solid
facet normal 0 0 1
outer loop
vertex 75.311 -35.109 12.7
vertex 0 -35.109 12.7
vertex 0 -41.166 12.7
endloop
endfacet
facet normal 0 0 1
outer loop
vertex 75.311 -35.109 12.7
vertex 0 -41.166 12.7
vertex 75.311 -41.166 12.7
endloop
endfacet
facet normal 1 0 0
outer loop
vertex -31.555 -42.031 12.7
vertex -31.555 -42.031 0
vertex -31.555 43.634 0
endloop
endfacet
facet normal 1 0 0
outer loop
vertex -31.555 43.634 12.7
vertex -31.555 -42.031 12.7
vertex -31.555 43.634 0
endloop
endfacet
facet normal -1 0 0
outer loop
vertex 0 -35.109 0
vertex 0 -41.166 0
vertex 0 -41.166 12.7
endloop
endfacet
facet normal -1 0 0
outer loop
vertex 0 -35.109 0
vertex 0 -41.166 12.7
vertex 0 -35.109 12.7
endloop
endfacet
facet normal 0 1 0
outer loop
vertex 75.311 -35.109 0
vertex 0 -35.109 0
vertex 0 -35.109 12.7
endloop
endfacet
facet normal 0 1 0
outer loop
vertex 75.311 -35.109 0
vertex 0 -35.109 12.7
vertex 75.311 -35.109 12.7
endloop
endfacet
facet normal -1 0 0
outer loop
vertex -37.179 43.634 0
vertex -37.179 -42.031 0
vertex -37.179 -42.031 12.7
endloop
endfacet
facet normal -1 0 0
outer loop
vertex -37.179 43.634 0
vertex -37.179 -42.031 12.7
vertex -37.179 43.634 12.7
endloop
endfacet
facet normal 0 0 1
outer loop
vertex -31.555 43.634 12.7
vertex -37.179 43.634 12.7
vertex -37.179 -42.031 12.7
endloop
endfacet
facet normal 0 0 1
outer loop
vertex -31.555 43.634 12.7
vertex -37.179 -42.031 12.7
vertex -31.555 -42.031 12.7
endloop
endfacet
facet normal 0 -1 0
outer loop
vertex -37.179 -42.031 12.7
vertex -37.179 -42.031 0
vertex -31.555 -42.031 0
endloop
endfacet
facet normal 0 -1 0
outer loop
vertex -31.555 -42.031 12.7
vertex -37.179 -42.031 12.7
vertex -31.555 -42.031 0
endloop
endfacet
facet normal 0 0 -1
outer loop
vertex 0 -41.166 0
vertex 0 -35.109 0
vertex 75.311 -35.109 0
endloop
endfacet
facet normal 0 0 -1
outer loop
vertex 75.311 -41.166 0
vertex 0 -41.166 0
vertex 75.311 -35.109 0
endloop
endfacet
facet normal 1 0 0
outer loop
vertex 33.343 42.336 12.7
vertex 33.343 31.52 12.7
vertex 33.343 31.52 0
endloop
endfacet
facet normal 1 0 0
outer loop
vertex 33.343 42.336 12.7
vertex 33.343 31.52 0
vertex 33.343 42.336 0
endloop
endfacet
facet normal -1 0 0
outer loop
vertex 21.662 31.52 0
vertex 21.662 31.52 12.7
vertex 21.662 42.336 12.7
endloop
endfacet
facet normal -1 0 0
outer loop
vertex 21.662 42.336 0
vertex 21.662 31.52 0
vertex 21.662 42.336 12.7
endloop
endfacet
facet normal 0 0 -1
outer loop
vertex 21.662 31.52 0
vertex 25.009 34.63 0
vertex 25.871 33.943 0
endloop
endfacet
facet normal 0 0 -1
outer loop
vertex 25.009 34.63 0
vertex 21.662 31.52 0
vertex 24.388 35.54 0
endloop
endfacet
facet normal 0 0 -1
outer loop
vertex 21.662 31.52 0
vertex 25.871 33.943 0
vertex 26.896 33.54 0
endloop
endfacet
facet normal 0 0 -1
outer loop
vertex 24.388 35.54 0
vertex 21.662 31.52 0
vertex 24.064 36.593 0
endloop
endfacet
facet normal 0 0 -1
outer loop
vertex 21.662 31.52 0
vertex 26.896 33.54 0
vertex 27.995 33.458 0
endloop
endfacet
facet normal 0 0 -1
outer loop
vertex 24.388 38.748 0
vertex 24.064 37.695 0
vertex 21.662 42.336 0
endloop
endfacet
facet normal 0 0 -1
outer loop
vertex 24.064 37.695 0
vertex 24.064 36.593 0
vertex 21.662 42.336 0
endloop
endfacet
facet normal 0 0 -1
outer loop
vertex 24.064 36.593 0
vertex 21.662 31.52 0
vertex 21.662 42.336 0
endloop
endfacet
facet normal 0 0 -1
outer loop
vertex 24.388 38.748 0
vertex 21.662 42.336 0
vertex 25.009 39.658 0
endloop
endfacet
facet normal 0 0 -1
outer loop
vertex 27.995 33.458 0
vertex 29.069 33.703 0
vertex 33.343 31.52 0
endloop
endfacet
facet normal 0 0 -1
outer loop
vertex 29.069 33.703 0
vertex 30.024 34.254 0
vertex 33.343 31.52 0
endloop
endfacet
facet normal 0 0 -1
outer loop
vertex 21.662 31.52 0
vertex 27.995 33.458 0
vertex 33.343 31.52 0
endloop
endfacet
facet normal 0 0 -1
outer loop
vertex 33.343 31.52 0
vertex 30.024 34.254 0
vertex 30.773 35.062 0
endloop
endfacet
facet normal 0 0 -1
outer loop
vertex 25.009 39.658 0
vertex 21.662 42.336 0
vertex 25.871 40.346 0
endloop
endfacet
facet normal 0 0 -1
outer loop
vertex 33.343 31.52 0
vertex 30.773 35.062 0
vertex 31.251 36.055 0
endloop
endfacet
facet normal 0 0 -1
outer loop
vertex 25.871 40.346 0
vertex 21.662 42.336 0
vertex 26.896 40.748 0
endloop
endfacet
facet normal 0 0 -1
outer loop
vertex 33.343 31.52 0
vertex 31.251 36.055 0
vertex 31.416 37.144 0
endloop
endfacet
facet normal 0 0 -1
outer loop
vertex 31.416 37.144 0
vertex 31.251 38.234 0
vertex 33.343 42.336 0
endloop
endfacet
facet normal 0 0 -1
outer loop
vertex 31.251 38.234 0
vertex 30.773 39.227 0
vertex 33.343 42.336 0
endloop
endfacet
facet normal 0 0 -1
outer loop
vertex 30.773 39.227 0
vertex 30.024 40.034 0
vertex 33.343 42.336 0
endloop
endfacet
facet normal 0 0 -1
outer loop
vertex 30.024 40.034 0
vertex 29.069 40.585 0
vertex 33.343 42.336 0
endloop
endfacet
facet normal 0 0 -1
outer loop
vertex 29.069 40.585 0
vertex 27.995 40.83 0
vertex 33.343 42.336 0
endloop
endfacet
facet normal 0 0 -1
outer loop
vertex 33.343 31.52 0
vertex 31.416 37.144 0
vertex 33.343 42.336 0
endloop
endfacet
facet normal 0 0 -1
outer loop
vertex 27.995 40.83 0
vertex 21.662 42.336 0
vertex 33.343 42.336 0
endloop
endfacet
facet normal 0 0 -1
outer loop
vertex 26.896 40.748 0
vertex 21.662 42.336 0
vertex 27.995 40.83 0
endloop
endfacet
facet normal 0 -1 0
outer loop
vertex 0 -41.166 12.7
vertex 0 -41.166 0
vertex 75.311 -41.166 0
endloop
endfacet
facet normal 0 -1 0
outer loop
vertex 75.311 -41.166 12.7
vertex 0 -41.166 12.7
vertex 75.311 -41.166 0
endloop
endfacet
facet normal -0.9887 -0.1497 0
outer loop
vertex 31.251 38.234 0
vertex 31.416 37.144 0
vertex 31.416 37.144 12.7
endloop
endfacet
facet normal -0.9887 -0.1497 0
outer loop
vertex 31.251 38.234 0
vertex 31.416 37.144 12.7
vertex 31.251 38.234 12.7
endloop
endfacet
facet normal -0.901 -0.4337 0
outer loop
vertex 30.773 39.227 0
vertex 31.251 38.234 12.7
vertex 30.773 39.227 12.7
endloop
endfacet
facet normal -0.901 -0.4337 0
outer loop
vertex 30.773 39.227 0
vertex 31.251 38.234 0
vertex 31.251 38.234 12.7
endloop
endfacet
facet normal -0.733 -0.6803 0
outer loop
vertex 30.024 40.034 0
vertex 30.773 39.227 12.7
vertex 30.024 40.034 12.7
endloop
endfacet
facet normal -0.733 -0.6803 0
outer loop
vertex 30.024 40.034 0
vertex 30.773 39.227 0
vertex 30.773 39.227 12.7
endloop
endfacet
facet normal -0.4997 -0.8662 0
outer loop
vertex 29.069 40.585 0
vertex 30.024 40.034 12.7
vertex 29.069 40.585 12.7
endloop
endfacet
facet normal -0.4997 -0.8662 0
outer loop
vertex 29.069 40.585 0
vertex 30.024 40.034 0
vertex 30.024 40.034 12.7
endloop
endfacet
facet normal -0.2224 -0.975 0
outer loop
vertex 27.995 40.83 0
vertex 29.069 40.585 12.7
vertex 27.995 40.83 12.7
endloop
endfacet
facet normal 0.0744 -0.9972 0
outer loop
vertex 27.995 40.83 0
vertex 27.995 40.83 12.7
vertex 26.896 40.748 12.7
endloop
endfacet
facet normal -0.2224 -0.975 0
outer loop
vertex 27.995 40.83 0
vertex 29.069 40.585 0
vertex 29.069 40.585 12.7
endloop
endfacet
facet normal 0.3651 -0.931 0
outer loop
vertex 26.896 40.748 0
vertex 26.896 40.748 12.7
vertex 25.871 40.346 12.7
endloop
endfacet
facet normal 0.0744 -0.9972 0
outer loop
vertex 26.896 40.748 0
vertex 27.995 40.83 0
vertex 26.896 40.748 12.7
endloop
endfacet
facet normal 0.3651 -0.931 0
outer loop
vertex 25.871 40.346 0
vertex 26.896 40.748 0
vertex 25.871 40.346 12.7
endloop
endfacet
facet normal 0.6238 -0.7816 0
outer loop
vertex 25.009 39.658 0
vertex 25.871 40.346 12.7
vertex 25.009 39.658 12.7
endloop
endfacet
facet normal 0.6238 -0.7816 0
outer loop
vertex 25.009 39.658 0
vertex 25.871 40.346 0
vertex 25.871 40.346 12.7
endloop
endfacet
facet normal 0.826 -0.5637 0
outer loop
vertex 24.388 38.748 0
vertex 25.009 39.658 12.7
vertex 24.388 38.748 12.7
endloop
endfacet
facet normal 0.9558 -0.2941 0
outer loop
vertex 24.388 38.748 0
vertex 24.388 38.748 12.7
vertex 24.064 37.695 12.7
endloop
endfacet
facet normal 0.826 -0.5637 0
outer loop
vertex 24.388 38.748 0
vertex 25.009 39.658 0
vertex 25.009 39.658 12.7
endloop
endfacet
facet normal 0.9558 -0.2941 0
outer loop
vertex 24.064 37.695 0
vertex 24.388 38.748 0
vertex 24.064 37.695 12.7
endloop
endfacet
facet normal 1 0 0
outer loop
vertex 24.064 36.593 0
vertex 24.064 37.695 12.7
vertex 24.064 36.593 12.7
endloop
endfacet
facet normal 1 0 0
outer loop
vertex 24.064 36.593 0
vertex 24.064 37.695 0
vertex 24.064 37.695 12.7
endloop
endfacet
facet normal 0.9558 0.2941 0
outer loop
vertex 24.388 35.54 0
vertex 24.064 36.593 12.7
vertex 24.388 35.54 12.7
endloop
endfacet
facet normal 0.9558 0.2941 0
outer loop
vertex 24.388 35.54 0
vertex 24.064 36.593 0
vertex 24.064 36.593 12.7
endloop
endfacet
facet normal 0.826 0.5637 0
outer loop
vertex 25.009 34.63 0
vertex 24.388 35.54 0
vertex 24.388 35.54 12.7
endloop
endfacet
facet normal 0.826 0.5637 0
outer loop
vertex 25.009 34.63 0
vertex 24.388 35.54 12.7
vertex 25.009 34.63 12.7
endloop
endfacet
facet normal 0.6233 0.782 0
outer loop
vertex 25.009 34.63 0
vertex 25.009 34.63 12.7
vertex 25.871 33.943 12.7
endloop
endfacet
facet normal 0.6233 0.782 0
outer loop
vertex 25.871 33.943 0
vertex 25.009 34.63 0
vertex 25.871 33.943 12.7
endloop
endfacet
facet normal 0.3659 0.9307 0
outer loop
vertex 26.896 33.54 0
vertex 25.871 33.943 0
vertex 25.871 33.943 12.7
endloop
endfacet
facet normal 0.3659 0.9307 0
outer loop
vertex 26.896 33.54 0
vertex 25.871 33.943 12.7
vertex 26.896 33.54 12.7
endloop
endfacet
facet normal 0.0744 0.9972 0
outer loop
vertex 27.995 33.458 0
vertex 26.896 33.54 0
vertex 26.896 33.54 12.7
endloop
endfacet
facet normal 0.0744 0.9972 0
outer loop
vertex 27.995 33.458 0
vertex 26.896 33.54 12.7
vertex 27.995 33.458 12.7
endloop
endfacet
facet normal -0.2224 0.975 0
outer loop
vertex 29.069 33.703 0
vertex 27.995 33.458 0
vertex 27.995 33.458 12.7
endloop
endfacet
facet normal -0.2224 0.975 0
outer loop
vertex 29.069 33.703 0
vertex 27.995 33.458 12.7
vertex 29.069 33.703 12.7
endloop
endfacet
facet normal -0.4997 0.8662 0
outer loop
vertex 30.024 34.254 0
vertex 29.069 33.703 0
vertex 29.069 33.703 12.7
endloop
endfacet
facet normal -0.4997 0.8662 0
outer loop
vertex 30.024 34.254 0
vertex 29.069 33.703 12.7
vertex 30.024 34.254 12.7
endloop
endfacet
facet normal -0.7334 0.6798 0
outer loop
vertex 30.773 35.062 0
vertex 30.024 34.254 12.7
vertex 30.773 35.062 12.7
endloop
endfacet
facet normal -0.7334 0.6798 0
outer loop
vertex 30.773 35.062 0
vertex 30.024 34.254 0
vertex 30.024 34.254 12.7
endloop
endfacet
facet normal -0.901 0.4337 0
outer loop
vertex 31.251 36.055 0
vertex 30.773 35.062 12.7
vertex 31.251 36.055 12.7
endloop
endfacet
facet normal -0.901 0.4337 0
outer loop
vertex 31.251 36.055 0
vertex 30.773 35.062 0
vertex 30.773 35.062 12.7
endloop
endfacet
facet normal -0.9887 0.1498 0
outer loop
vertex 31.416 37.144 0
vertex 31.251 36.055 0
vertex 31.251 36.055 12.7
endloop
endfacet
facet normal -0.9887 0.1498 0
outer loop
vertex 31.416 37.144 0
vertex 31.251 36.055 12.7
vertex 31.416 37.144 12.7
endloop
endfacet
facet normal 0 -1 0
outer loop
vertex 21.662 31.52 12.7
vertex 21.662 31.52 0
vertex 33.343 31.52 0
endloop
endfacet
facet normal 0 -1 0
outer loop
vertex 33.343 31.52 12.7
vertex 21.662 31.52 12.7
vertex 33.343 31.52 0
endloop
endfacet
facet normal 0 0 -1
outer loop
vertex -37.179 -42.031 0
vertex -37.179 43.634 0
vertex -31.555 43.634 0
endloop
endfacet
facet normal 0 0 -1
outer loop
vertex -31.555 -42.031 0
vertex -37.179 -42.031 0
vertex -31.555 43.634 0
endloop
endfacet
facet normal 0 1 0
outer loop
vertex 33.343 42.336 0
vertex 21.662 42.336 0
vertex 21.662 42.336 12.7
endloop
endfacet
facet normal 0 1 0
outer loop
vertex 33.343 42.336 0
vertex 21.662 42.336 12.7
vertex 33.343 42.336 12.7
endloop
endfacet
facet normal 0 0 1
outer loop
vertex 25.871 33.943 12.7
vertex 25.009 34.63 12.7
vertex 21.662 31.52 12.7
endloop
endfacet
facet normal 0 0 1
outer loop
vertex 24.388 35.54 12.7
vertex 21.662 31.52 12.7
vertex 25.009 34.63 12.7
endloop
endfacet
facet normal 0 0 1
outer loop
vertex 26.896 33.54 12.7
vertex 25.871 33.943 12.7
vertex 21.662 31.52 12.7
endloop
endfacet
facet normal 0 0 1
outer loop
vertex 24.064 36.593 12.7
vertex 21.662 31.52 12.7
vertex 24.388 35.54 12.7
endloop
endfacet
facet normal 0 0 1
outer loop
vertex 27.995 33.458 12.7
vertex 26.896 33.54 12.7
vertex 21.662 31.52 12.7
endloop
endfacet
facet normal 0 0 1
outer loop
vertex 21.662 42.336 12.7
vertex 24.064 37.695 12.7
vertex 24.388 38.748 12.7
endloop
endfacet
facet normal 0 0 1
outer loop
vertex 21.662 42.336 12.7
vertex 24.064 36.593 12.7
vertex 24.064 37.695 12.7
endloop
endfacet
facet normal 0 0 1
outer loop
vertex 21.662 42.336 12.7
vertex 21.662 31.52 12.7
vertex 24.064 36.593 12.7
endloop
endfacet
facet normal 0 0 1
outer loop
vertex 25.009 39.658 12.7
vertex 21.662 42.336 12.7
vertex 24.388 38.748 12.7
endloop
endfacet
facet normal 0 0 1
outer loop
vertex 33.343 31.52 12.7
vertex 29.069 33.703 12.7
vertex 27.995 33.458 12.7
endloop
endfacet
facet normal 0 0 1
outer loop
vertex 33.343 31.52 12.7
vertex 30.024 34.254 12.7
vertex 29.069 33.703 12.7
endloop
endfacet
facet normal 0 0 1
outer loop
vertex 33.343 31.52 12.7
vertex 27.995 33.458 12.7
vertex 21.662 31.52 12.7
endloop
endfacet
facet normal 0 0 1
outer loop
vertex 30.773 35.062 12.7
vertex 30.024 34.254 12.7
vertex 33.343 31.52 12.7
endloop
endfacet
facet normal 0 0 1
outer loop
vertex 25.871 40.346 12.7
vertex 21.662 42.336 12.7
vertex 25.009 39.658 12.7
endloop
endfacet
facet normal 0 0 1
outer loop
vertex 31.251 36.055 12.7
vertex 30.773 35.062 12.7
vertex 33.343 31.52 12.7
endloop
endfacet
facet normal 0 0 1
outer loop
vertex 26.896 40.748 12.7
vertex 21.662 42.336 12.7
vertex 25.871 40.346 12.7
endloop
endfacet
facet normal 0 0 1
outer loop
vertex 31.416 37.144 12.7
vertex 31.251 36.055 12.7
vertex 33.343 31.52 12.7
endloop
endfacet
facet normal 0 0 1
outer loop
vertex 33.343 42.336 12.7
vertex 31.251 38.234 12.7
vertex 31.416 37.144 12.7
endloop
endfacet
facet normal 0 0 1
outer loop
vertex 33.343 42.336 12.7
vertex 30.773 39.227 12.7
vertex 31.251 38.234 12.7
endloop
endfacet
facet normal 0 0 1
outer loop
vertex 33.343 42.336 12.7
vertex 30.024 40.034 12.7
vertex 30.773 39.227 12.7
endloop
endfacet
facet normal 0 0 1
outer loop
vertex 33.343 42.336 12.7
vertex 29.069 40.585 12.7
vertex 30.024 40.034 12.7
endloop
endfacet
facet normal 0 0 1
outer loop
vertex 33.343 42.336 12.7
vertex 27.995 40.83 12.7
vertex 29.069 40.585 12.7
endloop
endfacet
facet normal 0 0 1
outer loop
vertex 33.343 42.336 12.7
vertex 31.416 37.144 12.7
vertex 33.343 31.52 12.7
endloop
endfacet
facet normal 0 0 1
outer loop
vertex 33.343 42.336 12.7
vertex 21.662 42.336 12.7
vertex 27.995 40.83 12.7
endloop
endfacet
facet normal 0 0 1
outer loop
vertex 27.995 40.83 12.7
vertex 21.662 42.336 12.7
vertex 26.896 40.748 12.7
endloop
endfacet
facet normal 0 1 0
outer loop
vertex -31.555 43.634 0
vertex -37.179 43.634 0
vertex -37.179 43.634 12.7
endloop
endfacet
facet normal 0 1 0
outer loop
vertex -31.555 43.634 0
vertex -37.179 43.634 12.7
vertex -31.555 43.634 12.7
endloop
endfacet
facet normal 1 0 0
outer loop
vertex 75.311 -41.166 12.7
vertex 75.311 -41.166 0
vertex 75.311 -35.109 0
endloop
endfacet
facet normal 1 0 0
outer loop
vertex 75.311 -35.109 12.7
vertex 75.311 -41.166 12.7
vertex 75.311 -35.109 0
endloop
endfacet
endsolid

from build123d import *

# Parameters (mm, degrees)
F0_W     = 5.624492
F0_H     = 85.66533
F0_W_2   = 11.681639
F0_H_2   = 10.816324
F0_R     = 3.696591
F0_W_3   = 75.310782
F0_H_3   = 6.057143
F1_DEPTH = 12.7


with BuildPart() as f1:
    # F0 (on Top) → F1 (new body)
    with BuildSketch(Plane.XY):
        with Locations((-34.366803, 0.801295)):
            Rectangle(F0_W, F0_H)
        with Locations((27.502603, 36.927836)):
            Rectangle(F0_W_2, F0_H_2)
        with Locations((27.71893, 37.144162)):
            Circle(F0_R, mode=Mode.SUBTRACT)
        with Locations((37.655391, -38.137491)):
            Rectangle(F0_W_3, F0_H_3)
    extrude(amount=F1_DEPTH)


solid = f1.part
